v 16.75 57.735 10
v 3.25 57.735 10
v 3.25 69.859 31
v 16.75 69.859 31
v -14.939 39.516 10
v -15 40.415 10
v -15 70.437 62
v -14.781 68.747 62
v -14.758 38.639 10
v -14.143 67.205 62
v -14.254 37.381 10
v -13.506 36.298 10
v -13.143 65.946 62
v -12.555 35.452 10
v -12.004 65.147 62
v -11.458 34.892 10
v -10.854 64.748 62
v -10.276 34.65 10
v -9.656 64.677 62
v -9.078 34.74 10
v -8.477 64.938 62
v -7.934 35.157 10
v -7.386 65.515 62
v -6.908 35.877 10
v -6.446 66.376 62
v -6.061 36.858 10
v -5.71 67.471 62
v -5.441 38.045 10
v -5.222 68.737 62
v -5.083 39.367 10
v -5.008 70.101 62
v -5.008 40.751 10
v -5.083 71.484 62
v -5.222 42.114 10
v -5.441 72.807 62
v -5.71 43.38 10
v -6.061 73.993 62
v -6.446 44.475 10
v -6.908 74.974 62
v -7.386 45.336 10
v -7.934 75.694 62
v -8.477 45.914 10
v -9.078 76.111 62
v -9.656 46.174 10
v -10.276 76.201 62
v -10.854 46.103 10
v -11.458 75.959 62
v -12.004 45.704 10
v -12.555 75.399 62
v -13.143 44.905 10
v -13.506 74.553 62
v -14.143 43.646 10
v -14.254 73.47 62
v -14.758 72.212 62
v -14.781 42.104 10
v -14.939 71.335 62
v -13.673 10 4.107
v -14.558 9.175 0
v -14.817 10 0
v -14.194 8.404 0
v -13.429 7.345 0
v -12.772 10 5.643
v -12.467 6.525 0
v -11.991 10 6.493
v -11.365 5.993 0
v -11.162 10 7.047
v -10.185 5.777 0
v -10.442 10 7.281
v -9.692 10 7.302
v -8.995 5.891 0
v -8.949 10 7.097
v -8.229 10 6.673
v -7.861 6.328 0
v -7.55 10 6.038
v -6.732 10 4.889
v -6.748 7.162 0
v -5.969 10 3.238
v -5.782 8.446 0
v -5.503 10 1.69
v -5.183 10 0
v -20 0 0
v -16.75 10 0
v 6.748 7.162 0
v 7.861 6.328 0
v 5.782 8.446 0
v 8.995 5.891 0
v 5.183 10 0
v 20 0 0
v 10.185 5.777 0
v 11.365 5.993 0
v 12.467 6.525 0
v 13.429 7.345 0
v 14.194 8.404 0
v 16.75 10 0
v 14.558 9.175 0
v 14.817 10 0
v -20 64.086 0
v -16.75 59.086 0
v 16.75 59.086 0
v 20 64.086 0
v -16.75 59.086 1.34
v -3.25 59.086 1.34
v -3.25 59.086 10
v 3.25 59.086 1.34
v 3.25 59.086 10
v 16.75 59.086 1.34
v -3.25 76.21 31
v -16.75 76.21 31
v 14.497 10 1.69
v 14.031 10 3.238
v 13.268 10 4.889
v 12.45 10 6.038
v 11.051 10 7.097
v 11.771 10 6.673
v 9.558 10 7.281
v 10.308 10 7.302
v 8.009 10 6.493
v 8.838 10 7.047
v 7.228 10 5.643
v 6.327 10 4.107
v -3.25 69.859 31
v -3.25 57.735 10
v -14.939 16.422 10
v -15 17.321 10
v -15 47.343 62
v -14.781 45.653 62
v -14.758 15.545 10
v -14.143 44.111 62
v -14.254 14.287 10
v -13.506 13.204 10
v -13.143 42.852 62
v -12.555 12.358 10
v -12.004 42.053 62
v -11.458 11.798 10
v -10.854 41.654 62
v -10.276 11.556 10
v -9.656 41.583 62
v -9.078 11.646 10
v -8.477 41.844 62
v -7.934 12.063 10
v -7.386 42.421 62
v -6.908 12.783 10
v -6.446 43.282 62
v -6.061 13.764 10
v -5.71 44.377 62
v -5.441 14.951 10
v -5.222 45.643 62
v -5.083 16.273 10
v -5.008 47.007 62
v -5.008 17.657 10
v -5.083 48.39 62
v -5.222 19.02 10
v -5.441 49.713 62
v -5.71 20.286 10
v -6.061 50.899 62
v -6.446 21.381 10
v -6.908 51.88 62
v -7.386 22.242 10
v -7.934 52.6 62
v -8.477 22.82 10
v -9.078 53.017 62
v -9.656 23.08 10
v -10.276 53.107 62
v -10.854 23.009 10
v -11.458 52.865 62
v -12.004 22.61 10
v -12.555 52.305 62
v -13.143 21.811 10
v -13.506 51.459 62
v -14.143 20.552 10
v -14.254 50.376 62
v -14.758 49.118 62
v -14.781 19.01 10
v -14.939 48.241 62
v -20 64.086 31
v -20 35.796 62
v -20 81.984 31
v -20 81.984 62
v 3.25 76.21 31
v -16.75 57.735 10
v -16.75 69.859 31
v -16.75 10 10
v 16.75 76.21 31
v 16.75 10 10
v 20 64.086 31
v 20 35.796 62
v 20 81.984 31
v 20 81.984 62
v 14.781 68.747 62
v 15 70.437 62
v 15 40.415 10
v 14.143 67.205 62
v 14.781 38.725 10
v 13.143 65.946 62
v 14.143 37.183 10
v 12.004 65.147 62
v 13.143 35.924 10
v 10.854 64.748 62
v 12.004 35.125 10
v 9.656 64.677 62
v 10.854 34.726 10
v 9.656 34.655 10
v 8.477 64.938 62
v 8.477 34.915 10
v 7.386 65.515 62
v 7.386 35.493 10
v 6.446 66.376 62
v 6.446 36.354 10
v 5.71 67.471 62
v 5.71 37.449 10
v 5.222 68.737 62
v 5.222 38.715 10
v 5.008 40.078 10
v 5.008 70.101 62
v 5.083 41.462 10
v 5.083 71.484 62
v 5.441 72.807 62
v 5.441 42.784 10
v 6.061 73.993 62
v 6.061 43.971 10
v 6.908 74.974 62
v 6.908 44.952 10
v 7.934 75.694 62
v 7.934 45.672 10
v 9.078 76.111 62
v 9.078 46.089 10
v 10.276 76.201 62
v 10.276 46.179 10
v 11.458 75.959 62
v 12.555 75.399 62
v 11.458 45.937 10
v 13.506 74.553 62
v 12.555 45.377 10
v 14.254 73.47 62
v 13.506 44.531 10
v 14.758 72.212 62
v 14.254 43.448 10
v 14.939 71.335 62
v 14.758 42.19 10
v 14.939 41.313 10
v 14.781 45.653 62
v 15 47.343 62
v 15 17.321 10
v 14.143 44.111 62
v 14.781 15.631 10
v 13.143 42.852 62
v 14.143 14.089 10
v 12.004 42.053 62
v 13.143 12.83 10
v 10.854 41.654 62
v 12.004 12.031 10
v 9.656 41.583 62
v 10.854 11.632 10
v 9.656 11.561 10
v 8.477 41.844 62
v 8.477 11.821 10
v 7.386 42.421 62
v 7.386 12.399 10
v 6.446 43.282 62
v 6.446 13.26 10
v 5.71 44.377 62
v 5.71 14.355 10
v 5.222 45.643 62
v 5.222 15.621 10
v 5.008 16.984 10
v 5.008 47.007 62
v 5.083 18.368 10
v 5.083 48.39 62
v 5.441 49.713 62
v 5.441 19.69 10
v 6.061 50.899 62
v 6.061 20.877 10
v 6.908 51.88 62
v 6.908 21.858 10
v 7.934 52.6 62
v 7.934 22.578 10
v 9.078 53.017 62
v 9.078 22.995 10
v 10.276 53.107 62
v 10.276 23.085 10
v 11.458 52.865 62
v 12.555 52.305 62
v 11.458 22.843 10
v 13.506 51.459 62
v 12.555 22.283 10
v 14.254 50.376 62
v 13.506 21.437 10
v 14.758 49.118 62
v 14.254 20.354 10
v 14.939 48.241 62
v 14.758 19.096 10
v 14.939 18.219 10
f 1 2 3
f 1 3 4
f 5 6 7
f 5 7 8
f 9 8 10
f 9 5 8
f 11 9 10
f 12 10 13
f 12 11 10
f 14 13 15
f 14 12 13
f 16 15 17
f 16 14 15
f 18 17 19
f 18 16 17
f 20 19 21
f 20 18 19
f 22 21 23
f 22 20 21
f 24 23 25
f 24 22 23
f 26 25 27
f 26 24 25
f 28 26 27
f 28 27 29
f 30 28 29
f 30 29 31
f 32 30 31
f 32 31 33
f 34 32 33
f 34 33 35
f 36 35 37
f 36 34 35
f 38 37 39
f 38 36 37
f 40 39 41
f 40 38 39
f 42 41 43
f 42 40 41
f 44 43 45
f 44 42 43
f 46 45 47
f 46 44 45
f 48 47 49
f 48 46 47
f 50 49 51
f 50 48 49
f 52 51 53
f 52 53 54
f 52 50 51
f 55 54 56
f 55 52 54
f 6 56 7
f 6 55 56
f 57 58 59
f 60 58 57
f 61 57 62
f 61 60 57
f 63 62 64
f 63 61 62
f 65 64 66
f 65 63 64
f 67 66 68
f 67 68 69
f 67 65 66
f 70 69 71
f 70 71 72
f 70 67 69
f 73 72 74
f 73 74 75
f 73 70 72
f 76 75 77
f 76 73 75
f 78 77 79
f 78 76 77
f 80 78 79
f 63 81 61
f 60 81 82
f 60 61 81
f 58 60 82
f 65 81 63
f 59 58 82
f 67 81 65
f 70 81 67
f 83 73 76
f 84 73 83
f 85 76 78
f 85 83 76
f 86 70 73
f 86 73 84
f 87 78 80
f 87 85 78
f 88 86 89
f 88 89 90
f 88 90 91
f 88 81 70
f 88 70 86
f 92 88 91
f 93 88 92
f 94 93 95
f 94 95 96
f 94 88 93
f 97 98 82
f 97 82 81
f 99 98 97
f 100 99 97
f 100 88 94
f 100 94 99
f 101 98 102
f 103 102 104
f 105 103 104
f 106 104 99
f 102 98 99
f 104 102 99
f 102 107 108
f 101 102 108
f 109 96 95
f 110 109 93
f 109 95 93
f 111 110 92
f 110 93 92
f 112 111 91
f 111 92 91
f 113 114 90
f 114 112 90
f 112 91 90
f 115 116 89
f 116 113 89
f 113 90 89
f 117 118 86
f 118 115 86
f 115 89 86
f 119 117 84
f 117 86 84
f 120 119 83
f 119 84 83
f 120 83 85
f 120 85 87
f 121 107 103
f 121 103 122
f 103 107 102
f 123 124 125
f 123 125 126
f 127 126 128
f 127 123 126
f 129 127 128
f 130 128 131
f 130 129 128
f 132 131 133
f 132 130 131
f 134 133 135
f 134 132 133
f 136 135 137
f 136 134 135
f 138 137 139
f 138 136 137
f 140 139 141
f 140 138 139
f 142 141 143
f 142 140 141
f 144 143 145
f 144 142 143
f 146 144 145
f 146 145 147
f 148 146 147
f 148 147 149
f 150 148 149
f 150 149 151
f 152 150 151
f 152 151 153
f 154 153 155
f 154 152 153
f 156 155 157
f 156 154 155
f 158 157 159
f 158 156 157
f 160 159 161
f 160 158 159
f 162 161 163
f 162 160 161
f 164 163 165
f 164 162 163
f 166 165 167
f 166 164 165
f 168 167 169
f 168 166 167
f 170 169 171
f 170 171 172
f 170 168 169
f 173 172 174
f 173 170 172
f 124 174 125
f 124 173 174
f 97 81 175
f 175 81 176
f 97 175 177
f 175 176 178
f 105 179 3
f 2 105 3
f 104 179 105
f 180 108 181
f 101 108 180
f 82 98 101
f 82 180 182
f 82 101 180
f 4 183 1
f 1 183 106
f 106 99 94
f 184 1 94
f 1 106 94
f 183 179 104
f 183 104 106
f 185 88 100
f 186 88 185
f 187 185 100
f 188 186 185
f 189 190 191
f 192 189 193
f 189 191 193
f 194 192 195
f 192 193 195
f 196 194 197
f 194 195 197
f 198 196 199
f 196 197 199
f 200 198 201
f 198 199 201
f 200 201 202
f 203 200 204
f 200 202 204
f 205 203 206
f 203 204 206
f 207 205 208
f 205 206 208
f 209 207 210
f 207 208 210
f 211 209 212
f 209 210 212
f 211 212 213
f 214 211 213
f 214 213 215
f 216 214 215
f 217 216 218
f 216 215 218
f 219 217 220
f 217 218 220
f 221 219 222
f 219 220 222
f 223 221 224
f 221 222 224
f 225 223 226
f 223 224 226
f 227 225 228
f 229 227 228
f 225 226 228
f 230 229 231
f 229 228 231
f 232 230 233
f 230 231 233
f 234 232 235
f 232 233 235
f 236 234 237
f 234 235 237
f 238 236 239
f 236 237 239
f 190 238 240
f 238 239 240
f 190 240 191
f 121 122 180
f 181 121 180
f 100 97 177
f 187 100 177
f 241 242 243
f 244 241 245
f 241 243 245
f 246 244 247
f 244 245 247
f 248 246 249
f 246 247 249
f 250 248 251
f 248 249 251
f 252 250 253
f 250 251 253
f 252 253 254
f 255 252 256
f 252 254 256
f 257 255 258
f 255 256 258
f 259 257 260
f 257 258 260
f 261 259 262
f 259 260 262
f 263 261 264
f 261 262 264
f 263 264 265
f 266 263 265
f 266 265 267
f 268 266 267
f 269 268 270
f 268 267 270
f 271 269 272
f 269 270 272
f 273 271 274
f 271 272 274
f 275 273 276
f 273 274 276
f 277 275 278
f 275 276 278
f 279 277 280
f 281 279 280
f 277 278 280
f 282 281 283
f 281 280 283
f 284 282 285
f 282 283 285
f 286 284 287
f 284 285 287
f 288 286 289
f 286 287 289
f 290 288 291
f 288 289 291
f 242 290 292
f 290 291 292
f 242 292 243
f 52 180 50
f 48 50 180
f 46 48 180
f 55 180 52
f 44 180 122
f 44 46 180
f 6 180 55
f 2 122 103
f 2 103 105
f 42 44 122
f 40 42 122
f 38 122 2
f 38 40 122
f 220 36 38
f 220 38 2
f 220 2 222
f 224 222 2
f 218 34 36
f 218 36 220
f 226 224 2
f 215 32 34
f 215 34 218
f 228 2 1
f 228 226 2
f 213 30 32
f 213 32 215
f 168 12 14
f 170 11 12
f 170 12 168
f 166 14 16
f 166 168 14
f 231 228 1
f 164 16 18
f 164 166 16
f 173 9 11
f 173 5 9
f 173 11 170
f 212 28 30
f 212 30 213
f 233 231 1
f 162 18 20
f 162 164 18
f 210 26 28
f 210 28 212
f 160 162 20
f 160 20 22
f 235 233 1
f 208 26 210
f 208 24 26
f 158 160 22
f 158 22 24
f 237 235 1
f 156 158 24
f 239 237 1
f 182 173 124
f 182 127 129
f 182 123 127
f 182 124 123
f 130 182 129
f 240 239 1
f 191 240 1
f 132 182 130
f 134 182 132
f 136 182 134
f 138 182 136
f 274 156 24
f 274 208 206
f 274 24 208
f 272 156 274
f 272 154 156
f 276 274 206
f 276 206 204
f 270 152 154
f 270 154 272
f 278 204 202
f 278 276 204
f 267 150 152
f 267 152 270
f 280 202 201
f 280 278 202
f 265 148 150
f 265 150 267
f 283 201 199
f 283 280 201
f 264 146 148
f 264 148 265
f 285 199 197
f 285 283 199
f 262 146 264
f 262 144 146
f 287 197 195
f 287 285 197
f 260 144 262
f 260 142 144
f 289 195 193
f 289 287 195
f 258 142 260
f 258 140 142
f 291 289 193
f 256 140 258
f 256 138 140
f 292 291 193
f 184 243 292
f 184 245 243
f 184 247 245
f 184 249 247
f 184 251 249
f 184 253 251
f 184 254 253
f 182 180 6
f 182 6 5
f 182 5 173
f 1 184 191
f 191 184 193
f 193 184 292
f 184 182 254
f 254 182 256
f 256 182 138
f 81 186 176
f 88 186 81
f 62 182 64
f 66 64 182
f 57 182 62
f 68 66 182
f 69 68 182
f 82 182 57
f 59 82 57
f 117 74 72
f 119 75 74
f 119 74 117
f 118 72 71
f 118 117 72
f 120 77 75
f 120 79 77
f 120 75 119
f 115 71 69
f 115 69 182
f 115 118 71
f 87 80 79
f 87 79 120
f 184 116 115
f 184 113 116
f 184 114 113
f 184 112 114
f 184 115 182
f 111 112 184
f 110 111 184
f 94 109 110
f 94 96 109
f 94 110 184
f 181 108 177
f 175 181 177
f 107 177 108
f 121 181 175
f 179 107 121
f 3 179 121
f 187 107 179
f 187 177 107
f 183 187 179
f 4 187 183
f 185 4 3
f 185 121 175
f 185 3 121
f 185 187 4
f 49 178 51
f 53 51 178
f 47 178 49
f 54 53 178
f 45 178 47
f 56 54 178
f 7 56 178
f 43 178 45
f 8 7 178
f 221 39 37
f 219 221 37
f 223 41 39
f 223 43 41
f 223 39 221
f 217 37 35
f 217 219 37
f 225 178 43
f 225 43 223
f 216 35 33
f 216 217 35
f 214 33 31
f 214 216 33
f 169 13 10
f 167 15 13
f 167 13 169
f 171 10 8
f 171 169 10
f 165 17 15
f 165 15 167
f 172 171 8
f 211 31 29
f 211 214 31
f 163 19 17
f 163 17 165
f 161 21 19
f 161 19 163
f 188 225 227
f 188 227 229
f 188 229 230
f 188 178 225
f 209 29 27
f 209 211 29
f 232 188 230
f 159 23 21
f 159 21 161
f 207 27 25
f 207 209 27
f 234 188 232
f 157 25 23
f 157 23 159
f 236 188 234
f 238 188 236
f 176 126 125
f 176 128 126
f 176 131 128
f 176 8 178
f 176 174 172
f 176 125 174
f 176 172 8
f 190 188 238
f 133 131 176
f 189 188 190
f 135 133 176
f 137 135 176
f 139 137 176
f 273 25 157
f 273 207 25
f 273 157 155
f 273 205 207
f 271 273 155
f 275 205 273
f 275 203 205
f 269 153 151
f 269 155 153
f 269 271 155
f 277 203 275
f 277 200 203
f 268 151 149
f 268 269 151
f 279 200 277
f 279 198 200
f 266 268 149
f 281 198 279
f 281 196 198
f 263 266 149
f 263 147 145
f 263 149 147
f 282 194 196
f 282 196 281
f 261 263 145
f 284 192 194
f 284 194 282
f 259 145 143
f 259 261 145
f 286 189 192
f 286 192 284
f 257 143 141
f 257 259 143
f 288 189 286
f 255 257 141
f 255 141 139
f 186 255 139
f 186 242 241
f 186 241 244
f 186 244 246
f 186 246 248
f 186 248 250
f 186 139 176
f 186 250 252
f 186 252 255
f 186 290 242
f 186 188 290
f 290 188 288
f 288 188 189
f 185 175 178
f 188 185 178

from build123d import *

# Parameters (mm, degrees)
F1_DEPTH = 20
F3_R     = 5
F3_W     = 13.5
F3_H     = 5.5
F4_DEPTH = 500
F6_W     = 33.5
F6_H     = 49.08588
F7_DEPTH = 10


with BuildPart() as f1:
    # F0 (on Right) → F1 (new body)
    with BuildSketch(Plane.YZ):
        Polygon((35.795717, 62), (0, 0), (46.188022, 0), (64.08588, 0), (81.983738, 31), (64.08588, 31), (81.983738, 62), align=None)
    extrude(amount=F1_DEPTH)

    # F3 (on face) → F4 (cut, symmetric)
    with BuildSketch(Plane(origin=(0, 16.02147, 27.75), x_dir=(1, 0, 0), z_dir=(0, -0.5, -0.866025))):
        with Locations((10, -10)):
            Circle(F3_R)
        with Locations((10, -30)):
            Circle(F3_R)
        with Locations((10, -47.75)):
            Rectangle(F3_W, F3_H)
    extrude(amount=F4_DEPTH, both=True, mode=Mode.SUBTRACT)

    # F5: F1 across plane


with BuildPart() as f1_1:
    add(f1.part)
    add(f1.part.mirror(Plane.YZ))

    # F6 (on face) → F7 (cut)
    with BuildSketch(Plane(origin=(0, 0, 0), x_dir=(1, 0, 0), z_dir=(0, 0, -1))):
        with Locations((0, -34.54294)):
            Rectangle(F6_W, F6_H)
    extrude(amount=-F7_DEPTH, mode=Mode.SUBTRACT)


solid = f1_1.part
